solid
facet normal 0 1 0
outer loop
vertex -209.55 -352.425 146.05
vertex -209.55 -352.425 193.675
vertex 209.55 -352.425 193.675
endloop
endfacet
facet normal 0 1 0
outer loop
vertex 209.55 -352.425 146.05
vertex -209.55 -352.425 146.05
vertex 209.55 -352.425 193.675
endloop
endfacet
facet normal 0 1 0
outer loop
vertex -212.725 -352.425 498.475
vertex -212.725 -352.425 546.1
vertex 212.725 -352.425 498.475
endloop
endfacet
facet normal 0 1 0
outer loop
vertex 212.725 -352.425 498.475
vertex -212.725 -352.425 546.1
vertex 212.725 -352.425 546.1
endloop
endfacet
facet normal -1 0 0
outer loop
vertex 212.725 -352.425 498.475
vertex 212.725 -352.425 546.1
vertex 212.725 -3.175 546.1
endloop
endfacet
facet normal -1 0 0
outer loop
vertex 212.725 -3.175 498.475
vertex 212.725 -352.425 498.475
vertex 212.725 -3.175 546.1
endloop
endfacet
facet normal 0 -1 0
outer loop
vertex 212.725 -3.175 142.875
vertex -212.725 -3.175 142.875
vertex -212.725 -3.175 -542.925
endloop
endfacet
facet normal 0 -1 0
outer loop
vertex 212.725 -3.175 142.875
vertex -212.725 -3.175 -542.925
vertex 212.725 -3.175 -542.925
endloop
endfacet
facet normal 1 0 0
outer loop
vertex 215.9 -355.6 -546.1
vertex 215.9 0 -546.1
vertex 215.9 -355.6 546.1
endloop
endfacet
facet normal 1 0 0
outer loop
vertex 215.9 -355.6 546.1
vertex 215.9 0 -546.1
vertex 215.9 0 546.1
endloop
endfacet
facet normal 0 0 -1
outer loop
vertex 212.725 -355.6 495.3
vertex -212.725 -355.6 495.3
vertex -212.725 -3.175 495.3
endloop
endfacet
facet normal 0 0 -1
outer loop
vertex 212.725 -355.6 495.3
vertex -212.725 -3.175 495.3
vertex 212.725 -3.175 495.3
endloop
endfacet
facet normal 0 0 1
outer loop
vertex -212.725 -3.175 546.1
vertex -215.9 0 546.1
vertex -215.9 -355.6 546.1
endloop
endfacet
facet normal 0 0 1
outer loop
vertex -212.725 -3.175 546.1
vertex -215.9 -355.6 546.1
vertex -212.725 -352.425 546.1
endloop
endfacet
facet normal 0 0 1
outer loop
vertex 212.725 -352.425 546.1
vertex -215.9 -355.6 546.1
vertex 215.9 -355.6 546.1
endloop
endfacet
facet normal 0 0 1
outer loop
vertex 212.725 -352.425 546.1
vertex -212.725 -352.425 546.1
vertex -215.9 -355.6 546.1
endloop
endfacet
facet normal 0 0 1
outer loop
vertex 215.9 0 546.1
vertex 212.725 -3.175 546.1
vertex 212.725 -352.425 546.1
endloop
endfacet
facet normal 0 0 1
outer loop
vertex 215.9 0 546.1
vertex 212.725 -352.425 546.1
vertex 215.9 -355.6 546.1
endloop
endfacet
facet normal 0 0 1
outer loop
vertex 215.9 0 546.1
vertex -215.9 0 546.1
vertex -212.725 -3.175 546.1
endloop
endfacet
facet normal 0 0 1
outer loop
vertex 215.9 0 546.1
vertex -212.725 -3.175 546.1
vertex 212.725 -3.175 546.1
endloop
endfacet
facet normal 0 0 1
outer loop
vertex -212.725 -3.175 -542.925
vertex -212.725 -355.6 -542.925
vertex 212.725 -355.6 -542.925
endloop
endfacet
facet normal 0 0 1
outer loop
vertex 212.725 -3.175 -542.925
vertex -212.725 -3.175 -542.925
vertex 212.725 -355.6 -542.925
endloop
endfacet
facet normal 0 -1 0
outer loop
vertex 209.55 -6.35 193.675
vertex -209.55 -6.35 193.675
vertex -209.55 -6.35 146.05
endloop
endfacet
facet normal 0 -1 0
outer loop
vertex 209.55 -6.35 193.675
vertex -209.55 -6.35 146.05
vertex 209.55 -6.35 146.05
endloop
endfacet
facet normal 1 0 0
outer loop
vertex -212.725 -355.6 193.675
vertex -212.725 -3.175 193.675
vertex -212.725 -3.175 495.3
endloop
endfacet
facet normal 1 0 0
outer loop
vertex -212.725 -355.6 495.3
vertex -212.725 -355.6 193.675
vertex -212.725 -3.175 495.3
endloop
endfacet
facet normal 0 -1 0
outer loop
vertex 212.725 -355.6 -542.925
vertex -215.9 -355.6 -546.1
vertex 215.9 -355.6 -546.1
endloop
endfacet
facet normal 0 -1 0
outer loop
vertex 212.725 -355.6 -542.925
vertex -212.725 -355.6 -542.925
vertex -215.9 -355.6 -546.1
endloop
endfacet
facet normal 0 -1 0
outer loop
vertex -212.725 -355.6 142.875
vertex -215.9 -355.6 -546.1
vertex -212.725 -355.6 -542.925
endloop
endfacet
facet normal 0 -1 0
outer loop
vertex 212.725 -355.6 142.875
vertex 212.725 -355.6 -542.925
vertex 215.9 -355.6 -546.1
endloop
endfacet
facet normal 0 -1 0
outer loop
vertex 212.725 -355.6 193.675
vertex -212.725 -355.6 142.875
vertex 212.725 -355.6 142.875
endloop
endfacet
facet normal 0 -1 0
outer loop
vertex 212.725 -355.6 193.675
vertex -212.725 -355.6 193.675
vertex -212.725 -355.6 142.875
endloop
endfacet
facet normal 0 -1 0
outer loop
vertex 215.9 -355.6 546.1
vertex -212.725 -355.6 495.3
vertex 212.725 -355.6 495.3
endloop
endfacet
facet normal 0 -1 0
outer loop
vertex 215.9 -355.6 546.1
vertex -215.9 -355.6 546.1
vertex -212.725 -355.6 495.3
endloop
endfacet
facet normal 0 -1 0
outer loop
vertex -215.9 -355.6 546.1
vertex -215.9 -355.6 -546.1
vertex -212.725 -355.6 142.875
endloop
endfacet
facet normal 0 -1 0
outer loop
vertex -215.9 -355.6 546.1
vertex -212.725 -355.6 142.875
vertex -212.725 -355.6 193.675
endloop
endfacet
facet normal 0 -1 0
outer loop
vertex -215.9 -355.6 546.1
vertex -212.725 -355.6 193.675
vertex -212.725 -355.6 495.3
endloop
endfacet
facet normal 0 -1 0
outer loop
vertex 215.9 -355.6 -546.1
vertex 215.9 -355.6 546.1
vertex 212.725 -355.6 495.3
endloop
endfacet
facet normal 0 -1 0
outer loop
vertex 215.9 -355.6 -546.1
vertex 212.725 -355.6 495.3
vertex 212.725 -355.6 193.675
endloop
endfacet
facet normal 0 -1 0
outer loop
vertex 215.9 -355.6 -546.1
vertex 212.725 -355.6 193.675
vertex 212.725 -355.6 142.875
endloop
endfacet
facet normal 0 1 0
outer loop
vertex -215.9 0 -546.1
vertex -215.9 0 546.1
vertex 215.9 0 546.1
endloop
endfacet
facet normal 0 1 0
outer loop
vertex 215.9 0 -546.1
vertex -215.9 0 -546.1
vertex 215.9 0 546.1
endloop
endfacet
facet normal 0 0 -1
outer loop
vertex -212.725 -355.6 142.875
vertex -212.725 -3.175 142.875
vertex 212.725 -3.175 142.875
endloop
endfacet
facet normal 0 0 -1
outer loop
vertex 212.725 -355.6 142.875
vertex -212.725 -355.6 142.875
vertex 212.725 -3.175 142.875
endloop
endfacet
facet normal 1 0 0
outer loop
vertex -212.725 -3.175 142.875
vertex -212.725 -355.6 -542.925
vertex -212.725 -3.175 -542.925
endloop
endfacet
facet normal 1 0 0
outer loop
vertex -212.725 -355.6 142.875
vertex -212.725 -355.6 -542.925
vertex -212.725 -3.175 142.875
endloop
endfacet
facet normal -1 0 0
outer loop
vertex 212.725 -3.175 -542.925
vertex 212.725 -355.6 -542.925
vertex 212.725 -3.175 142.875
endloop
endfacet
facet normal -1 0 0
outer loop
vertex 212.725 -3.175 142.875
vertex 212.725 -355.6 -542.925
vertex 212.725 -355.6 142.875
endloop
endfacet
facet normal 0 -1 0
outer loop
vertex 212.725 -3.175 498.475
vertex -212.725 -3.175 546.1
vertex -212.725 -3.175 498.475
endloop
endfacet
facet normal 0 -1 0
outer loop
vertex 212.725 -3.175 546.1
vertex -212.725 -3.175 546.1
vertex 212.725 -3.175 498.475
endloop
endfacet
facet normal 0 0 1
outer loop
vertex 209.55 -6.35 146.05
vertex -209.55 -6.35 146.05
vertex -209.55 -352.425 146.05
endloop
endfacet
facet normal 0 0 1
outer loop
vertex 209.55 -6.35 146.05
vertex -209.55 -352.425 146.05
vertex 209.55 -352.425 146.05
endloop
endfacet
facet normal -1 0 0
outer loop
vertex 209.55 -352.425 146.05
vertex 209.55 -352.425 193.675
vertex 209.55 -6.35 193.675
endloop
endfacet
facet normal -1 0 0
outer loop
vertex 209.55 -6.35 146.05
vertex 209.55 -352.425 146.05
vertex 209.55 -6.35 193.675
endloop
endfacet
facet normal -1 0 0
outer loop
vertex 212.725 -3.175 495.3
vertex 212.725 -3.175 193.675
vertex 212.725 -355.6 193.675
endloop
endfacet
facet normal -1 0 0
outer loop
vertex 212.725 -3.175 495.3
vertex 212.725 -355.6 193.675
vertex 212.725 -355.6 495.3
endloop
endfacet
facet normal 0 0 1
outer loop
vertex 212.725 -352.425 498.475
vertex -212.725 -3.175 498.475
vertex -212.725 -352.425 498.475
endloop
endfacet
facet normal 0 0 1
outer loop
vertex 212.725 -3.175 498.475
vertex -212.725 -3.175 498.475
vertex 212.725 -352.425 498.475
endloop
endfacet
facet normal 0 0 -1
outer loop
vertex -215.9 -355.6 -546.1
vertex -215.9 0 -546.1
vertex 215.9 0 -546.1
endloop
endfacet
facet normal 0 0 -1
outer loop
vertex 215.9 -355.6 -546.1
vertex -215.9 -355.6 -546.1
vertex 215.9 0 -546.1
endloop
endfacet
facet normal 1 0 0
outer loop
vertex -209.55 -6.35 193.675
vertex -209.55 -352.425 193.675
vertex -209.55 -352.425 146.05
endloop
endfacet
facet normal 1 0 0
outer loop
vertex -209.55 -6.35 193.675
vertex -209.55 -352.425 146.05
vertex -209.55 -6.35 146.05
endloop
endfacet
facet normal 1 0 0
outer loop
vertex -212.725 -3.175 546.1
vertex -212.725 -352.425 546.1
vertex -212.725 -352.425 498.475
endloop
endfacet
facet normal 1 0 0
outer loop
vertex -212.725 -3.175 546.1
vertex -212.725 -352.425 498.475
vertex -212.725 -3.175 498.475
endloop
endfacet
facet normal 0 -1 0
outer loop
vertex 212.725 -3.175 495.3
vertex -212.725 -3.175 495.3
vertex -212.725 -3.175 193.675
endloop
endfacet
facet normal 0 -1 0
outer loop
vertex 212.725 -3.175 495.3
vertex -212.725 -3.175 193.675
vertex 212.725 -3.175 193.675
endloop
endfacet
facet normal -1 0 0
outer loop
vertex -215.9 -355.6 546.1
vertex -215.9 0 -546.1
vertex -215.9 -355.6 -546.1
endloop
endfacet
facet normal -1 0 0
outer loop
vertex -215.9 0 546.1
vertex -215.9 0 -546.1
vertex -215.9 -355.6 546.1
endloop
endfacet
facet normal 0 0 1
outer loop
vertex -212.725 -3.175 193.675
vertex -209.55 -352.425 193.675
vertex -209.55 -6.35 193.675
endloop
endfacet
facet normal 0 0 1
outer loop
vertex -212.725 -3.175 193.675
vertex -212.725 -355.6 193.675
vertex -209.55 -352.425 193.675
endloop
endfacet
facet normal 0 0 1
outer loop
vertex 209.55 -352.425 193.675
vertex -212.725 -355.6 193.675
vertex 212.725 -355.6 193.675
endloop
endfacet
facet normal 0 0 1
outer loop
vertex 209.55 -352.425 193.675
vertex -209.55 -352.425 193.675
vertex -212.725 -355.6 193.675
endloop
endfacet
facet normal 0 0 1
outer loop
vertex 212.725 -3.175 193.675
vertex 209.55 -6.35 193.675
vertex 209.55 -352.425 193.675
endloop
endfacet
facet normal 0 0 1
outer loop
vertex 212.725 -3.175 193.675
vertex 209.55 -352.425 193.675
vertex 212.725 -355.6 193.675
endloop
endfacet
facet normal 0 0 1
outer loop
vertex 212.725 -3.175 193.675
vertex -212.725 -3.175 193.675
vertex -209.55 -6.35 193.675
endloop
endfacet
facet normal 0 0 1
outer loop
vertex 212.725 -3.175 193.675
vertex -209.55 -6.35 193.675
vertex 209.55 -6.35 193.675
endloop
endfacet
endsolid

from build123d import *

# Parameters (mm, degrees)
F0_W     = 431.8
F0_H     = 1092.2
F1_DEPTH = 355.6
F2_W     = 425.45
F2_H     = 1038.225
F3_DEPTH = 352.425
F4_W     = 425.45
F4_H     = 50.8
F5_DEPTH = 352.425
F6_W     = 419.1
F6_H     = 346.075
F7_DEPTH = 47.625
F8_W     = 425.45
F8_H     = 349.25
F9_DEPTH = 47.625


with BuildPart() as f1:
    # F0 (on Front) → F1 (new body)
    with BuildSketch(Plane.XZ):
        Rectangle(F0_W, F0_H)
    extrude(amount=F1_DEPTH)

    # F2 (on face) → F3 (cut)
    with BuildSketch(Plane.XZ.offset(355.6)):
        with Locations((0, -23.8125)):
            Rectangle(F2_W, F2_H)
    extrude(amount=-F3_DEPTH, mode=Mode.SUBTRACT)

    # F4 (on face) → F5 (join, through all)
    with BuildSketch(Plane.XZ.offset(3.175)):
        with Locations((0, 168.275)):
            Rectangle(F4_W, F4_H)
    extrude(amount=F5_DEPTH)

    # F6 (on face) → F7 (cut)
    with BuildSketch(Plane.XY.offset(193.675)):
        with Locations((0, -179.3875)):
            Rectangle(F6_W, F6_H)
    extrude(amount=-F7_DEPTH, mode=Mode.SUBTRACT)

    # F8 (on face) → F9 (cut)
    with BuildSketch(Plane.XY.offset(546.1)):
        with Locations((0, -177.8)):
            Rectangle(F8_W, F8_H)
    extrude(amount=-F9_DEPTH, mode=Mode.SUBTRACT)


solid = f1.part
